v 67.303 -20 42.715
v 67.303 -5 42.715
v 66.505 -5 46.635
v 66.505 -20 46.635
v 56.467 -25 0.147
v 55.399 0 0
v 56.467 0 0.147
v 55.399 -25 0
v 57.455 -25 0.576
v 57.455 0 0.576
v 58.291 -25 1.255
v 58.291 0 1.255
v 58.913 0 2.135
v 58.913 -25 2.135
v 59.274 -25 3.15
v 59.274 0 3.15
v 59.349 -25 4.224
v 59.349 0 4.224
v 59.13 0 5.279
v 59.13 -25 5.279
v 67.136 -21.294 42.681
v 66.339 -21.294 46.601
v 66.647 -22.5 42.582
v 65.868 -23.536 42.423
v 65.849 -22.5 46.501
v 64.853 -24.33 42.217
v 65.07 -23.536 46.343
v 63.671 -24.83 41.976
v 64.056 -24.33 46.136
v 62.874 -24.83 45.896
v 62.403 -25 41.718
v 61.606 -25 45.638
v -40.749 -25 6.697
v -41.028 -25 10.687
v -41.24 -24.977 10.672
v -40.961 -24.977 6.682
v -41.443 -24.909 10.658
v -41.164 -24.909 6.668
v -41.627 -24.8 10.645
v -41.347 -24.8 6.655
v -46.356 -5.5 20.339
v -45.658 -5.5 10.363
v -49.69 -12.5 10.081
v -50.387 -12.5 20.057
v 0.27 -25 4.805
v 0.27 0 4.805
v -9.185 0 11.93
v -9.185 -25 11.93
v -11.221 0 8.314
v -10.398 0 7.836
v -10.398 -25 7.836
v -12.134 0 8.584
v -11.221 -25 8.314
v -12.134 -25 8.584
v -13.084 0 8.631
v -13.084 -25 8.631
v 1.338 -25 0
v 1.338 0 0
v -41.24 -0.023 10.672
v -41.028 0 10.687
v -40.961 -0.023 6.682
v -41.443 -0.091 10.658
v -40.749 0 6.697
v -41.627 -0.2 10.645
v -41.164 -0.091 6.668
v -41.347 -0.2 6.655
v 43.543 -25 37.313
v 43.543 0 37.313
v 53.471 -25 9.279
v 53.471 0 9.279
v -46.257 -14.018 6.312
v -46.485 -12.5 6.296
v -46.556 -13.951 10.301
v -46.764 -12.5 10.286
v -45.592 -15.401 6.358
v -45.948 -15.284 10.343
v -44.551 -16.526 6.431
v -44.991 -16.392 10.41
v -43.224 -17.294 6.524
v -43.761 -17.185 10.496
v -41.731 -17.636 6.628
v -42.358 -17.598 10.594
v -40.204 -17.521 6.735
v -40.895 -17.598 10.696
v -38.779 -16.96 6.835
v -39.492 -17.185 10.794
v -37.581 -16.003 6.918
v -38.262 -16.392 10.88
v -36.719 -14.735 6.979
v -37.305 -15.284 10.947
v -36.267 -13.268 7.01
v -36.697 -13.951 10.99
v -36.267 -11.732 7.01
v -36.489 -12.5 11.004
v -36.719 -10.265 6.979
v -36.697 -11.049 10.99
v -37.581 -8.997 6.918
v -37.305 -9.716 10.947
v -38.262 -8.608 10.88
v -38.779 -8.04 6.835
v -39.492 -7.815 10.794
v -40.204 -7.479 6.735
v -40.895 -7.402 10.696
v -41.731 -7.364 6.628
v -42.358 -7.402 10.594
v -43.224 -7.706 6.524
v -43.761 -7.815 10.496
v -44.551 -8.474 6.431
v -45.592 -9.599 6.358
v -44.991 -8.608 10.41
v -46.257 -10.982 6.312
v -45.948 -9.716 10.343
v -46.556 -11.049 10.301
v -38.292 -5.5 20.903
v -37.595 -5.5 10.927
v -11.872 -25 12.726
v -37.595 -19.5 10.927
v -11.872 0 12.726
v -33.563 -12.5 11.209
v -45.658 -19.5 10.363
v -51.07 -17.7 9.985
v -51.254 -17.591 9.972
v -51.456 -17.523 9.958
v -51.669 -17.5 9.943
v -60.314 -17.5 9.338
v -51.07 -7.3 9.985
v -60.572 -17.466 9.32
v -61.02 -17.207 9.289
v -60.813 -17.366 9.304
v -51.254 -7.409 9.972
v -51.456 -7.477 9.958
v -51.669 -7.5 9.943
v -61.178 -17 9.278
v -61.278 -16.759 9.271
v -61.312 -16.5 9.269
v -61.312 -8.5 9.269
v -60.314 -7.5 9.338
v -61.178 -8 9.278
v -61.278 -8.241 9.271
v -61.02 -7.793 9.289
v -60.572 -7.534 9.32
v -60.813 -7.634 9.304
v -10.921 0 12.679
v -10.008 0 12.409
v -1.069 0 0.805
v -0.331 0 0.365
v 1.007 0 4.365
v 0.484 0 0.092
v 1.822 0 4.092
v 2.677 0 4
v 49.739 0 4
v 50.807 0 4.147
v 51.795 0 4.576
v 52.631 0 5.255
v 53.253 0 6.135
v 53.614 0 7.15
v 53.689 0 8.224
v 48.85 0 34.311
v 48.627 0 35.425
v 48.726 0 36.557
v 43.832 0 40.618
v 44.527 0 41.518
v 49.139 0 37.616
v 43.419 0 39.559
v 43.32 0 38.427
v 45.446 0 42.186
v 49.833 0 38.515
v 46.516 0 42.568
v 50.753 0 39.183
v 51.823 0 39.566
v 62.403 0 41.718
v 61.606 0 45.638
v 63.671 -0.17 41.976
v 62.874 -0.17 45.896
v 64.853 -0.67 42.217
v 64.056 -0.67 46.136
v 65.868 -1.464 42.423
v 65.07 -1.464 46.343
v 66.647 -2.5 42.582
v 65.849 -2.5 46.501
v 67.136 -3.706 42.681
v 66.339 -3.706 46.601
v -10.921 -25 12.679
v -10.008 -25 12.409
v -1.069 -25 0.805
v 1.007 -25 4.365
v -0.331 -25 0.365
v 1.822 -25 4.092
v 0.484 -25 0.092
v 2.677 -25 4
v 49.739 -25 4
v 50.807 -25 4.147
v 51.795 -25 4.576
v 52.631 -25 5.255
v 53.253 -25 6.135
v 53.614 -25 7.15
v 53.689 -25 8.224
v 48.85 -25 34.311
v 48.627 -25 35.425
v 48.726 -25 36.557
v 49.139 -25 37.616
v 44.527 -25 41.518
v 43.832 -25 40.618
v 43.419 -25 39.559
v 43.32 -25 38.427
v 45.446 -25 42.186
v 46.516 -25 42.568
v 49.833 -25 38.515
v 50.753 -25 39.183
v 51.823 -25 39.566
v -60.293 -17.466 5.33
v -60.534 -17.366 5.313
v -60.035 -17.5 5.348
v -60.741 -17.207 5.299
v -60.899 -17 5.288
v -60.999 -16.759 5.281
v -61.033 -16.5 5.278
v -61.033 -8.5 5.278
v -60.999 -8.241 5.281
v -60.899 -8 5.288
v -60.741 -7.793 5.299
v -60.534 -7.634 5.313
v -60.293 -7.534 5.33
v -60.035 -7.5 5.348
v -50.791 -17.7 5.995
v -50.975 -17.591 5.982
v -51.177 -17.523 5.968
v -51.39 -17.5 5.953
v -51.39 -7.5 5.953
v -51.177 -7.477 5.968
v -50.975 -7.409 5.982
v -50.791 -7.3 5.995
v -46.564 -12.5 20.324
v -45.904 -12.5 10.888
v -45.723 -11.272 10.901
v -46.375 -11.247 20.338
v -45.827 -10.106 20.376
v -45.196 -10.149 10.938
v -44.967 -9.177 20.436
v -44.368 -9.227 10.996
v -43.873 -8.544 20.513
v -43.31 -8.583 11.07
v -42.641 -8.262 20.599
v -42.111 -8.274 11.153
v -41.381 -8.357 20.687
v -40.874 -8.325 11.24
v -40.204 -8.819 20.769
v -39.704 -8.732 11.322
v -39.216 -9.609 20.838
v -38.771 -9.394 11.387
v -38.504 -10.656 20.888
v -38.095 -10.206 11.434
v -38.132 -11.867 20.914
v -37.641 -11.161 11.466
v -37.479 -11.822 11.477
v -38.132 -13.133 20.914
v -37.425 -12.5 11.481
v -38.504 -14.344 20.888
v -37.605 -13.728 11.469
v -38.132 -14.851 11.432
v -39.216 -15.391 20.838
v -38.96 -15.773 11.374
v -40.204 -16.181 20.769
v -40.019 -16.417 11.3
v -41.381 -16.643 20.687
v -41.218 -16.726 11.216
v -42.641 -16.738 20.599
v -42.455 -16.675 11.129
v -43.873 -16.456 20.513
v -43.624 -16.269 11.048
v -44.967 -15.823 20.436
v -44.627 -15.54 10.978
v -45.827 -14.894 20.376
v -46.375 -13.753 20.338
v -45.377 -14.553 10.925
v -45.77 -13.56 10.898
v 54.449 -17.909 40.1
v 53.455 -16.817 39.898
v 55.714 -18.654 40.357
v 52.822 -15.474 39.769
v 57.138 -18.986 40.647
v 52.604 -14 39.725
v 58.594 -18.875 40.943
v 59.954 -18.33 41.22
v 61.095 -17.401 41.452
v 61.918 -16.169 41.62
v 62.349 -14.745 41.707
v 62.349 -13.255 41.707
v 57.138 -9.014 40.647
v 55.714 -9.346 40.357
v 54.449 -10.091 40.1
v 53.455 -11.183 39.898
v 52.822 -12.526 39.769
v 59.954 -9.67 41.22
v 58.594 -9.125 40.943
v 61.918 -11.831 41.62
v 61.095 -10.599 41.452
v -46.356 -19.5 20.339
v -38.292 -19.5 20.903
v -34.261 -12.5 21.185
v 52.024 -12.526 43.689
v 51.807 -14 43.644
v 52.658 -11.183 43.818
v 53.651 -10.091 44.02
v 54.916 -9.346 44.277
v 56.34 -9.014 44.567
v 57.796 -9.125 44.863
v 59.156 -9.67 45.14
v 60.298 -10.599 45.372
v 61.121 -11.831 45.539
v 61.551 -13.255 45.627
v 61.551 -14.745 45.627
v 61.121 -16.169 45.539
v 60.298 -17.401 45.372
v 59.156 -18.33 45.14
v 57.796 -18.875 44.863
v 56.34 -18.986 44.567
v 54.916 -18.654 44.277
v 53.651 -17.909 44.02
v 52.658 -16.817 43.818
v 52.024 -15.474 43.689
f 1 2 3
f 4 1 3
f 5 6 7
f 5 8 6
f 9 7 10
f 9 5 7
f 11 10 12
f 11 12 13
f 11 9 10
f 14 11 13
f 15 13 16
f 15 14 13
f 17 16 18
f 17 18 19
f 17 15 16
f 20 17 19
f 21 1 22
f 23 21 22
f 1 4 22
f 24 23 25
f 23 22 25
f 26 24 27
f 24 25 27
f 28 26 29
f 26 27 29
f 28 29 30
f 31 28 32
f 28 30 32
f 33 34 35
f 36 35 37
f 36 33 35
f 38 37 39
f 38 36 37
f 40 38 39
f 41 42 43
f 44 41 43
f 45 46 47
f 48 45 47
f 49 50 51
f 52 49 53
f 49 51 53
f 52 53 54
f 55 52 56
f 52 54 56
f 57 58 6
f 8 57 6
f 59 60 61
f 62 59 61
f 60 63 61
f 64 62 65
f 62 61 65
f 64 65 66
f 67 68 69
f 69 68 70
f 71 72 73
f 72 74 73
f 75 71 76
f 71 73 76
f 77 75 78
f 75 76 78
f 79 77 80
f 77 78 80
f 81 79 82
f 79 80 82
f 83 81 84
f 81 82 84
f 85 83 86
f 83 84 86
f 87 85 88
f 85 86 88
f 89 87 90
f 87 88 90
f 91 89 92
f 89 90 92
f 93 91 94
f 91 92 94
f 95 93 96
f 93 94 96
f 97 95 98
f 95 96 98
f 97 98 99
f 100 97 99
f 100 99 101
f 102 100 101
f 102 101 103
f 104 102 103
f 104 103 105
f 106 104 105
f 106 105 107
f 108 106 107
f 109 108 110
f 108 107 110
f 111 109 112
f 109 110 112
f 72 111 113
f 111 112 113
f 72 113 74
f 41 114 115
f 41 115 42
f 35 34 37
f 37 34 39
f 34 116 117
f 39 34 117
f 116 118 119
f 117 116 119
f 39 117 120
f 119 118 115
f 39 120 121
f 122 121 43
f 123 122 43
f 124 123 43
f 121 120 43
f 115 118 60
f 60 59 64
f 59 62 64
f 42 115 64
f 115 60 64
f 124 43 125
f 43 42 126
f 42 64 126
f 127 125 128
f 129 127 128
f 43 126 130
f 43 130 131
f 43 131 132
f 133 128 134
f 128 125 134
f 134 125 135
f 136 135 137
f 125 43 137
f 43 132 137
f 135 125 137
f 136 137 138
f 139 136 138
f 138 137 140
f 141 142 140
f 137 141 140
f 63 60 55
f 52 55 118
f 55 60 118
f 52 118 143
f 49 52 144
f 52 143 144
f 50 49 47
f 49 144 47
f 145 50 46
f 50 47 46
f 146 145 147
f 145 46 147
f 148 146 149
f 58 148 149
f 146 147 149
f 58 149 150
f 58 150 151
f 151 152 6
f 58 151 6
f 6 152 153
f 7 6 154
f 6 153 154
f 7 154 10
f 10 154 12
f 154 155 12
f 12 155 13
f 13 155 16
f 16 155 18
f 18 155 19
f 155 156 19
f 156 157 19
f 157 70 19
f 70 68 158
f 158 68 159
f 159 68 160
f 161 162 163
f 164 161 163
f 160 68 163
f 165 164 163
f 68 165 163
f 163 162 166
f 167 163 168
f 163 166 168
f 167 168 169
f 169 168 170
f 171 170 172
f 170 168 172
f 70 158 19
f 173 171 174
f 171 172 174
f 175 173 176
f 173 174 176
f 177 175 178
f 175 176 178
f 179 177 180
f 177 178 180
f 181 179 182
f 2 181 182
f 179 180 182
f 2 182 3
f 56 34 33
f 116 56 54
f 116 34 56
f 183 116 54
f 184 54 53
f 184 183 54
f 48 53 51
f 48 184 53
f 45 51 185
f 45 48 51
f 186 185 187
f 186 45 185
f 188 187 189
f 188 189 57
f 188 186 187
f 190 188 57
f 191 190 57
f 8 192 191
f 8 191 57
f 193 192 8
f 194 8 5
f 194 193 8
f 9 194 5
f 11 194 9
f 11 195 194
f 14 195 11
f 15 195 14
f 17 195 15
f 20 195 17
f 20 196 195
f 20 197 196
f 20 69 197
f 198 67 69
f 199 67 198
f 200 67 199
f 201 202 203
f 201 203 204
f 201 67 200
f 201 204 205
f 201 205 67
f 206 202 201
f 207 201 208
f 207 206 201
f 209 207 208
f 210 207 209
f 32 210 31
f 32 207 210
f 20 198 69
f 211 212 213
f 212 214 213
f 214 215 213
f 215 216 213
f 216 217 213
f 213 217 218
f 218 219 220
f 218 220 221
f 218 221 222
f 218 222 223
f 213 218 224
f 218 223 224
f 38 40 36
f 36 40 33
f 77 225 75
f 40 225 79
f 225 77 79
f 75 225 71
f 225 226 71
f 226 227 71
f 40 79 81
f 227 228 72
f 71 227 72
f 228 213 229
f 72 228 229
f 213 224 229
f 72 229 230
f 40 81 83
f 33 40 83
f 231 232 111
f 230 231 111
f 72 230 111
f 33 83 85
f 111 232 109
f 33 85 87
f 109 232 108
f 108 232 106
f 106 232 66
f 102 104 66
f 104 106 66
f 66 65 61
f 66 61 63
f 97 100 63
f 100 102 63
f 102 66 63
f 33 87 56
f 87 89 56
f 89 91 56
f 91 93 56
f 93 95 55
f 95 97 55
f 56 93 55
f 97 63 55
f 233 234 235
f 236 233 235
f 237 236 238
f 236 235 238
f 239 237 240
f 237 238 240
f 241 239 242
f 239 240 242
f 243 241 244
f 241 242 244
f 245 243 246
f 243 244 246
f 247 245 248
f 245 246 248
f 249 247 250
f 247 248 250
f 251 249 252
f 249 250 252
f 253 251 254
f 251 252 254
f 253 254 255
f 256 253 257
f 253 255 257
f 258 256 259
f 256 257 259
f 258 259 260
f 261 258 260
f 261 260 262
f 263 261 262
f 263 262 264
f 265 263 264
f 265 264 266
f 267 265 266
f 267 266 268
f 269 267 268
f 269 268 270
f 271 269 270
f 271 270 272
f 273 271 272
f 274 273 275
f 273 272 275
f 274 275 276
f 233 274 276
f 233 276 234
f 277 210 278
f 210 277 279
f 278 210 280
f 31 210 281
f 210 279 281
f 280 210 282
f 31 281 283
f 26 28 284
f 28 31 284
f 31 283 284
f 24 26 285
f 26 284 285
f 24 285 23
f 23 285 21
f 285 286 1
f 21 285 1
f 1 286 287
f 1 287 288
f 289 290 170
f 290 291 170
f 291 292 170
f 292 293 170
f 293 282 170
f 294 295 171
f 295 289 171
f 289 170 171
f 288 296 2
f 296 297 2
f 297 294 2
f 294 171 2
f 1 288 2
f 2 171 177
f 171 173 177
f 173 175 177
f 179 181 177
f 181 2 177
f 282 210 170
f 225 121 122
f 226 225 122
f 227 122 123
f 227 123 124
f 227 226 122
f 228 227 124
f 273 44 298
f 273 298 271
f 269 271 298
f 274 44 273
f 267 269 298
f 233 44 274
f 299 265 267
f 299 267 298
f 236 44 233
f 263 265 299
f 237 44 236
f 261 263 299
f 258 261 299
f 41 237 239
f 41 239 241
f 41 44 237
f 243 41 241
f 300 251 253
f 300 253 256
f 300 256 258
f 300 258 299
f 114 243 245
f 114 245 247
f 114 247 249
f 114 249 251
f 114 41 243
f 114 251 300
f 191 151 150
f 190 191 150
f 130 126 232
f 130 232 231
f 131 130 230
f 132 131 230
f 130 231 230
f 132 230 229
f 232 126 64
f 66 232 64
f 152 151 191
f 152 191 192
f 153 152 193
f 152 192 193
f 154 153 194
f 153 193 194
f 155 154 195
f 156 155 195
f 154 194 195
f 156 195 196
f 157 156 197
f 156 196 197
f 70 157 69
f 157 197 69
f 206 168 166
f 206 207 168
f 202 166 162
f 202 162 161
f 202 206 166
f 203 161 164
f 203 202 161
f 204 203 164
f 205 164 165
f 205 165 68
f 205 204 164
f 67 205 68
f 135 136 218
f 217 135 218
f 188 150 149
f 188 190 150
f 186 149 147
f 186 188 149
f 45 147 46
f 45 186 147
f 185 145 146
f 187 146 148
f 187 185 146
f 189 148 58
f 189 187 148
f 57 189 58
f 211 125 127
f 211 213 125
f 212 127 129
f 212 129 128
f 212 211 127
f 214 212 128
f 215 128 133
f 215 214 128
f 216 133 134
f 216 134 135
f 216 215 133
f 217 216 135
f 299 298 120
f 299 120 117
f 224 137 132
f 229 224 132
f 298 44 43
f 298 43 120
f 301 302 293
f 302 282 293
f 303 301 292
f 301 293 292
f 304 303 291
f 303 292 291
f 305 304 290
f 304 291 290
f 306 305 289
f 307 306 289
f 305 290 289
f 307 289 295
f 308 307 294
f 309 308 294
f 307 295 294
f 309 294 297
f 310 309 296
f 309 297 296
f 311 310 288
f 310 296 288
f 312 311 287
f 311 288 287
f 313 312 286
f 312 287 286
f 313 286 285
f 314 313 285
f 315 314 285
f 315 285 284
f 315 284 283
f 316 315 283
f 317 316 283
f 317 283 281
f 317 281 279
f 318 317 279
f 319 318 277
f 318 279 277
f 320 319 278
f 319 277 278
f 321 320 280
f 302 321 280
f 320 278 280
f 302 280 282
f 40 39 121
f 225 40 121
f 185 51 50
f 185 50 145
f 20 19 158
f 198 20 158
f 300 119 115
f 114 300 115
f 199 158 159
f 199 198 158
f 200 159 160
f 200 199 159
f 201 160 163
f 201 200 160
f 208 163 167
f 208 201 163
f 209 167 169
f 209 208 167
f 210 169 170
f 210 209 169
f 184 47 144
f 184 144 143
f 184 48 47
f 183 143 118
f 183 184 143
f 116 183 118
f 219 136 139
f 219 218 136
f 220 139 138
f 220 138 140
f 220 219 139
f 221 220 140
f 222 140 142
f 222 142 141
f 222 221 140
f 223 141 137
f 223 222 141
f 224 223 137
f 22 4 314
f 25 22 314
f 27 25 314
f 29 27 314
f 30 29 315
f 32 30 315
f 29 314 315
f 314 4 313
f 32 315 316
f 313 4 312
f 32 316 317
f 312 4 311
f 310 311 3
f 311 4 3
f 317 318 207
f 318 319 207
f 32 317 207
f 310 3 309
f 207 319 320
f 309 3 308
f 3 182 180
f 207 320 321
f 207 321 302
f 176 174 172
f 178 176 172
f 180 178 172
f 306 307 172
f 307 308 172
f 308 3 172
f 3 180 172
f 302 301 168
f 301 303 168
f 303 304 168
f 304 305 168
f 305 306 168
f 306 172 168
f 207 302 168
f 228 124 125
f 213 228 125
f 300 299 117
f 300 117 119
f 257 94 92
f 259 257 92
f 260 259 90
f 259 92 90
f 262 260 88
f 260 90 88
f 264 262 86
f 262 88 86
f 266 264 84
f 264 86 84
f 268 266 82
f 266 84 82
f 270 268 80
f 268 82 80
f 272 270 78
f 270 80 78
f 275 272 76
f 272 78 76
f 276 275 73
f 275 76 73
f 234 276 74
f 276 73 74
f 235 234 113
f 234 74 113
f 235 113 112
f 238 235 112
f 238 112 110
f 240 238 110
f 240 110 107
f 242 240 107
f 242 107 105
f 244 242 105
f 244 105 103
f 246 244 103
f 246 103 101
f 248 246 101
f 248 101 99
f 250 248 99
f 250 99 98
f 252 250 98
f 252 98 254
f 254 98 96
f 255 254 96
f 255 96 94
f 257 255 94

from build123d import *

# Parameters (mm, degrees)
F1_DEPTH  = 25
F2_R      = 4
F3_R      = 3.9581459444
F4_R      = 5
F6_DEPTH  = 4
F7_R      = 1
F9_DEPTH  = 10
F11_D     = 8.5
F11_DEPTH = 20
F11_TIP   = 2.5536576309
F13_D     = 10.3
F13_DEPTH = 4
F13_TIP   = 3.094432188
F15_D     = 10
F15_DEPTH = 4
F15_TIP   = 3.0043030951


with BuildPart() as f1:
    # F0 (on Front) → F1 (new body)
    with BuildSketch(Plane.XZ):
        Polygon((-11.592581531, 8.7356367638), (0, 0), (61, 0), (47.3139187714, 38.6483011348), (67.3029387003, 42.7151132025), (66.5054669627, 46.634812021), (42.0073493471, 41.6506136606), (55.3401309115, 4), (1.338381278, 4), (-10.3797117652, 12.8302164722), (-61.3117864463, 9.2686988641), (-61.0327605513, 5.278442663), align=None)
    extrude(amount=F1_DEPTH)

    # F2
    f2_edges = [f1.edges().sort_by_distance(p)[0] for p in [
        (42.007349, -12.5, 41.650614),
        (1.338381, -12.5, 4),
        (-10.379712, -12.5, 12.830216),
        (-11.592582, -12.5, 8.735637),
        (0, -12.5, 0),
        (47.313919, -12.5, 38.648301),
    ]]
    fillet(f2_edges, radius=F2_R)

    # F3
    f3_edges = [f1.edges().sort_by_distance(p)[0] for p in [
        (55.340131, -12.5, 4),
        (61, -12.5, 0),
    ]]
    fillet(f3_edges, radius=F3_R)

    # F4
    f4_edges = [f1.edges().sort_by_distance(p)[0] for p in [
        (66.904203, -25, 44.674963),
        (66.904203, 0, 44.674963),
    ]]
    fillet(f4_edges, radius=F4_R)

    # F5 (on face) → F6 (cut)
    with BuildSketch(Plane(origin=(-0.9433178269, 0, 13.4900734165), x_dir=(0.9975640503, 0, 0.0697564737), z_dir=(-0.0697564737, 0, 0.9975640503))):
        Polygon((-60.5158822671, 0), (-60.5158822671, -7.5), (-50.5158822671, -7.5), (-40.5158822671, 0), align=None)
        Polygon((-50.5158822671, -17.5), (-60.5158822671, -17.5), (-60.5158822671, -25), (-40.5158822671, -25), align=None)
    extrude(amount=-F6_DEPTH, mode=Mode.SUBTRACT)

    # F7
    f7_edges = [f1.edges().sort_by_distance(p)[0] for p in [
        (-41.220992, -25, 8.6687),
        (-51.196633, -17.5, 7.971136),
        (-61.172273, -17.5, 7.273571),
        (-61.172273, -7.5, 7.273571),
        (-41.220992, 0, 8.6687),
        (-51.196633, -7.5, 7.971136),
    ]]
    fillet(f7_edges, radius=F7_R)

    # F8 (on face) → F9 (join)
    with BuildSketch(Plane(origin=(-0.9433178269, 0, 13.4900734165), x_dir=(0.9975640503, 0, 0.0697564737), z_dir=(-0.0697564737, 0, 0.9975640503))):
        Polygon((-36.7410970494, -19.5), (-32.6996451651, -12.5), (-36.7410970494, -5.5), (-44.8240008181, -5.5), (-48.8654527024, -12.5), (-44.8240008181, -19.5), align=None)
    extrude(amount=F9_DEPTH)

    # F11
    with Locations(Plane(origin=(-1.6408825643, 0, 23.4657139191), x_dir=(0.9975640503, 0, 0.0697564737), z_dir=(-0.0697564737, 0, 0.9975640503))):
        with Locations((-40.7825489337, -12.5)):
            Hole(F11_D / 2, depth=F11_DEPTH)
            with Locations((0, 0, -(F11_DEPTH + F11_TIP / 2))):  # 118° drill point
                Cone(0, F11_D / 2, F11_TIP, mode=Mode.SUBTRACT)

    # F13
    with Locations(Plane(origin=(-0.6642919319, 0, 9.4998172155), x_dir=(0.9975640503, 0, 0.0697564737), z_dir=(0.0697564737, 0, -0.9975640503))):
        with Locations((-40.7825489337, 12.5)):
            Hole(F13_D / 2, depth=F13_DEPTH)
            with Locations((0, 0, -(F13_DEPTH + F13_TIP / 2))):  # 118° drill point
                Cone(0, F13_D / 2, F13_TIP, mode=Mode.SUBTRACT)

    # F15
    with Locations(Plane(origin=(-6.4674054427, 0, 31.7883133346), x_dir=(0.9799247046, 0, 0.1993679344), z_dir=(-0.1993679344, 0, 0.9799247046))):
        with Locations((64.4678362136, -14)):
            Hole(F15_D / 2, depth=F15_DEPTH)
            with Locations((0, 0, -(F15_DEPTH + F15_TIP / 2))):  # 118° drill point
                Cone(0, F15_D / 2, F15_TIP, mode=Mode.SUBTRACT)


solid = f1.part
